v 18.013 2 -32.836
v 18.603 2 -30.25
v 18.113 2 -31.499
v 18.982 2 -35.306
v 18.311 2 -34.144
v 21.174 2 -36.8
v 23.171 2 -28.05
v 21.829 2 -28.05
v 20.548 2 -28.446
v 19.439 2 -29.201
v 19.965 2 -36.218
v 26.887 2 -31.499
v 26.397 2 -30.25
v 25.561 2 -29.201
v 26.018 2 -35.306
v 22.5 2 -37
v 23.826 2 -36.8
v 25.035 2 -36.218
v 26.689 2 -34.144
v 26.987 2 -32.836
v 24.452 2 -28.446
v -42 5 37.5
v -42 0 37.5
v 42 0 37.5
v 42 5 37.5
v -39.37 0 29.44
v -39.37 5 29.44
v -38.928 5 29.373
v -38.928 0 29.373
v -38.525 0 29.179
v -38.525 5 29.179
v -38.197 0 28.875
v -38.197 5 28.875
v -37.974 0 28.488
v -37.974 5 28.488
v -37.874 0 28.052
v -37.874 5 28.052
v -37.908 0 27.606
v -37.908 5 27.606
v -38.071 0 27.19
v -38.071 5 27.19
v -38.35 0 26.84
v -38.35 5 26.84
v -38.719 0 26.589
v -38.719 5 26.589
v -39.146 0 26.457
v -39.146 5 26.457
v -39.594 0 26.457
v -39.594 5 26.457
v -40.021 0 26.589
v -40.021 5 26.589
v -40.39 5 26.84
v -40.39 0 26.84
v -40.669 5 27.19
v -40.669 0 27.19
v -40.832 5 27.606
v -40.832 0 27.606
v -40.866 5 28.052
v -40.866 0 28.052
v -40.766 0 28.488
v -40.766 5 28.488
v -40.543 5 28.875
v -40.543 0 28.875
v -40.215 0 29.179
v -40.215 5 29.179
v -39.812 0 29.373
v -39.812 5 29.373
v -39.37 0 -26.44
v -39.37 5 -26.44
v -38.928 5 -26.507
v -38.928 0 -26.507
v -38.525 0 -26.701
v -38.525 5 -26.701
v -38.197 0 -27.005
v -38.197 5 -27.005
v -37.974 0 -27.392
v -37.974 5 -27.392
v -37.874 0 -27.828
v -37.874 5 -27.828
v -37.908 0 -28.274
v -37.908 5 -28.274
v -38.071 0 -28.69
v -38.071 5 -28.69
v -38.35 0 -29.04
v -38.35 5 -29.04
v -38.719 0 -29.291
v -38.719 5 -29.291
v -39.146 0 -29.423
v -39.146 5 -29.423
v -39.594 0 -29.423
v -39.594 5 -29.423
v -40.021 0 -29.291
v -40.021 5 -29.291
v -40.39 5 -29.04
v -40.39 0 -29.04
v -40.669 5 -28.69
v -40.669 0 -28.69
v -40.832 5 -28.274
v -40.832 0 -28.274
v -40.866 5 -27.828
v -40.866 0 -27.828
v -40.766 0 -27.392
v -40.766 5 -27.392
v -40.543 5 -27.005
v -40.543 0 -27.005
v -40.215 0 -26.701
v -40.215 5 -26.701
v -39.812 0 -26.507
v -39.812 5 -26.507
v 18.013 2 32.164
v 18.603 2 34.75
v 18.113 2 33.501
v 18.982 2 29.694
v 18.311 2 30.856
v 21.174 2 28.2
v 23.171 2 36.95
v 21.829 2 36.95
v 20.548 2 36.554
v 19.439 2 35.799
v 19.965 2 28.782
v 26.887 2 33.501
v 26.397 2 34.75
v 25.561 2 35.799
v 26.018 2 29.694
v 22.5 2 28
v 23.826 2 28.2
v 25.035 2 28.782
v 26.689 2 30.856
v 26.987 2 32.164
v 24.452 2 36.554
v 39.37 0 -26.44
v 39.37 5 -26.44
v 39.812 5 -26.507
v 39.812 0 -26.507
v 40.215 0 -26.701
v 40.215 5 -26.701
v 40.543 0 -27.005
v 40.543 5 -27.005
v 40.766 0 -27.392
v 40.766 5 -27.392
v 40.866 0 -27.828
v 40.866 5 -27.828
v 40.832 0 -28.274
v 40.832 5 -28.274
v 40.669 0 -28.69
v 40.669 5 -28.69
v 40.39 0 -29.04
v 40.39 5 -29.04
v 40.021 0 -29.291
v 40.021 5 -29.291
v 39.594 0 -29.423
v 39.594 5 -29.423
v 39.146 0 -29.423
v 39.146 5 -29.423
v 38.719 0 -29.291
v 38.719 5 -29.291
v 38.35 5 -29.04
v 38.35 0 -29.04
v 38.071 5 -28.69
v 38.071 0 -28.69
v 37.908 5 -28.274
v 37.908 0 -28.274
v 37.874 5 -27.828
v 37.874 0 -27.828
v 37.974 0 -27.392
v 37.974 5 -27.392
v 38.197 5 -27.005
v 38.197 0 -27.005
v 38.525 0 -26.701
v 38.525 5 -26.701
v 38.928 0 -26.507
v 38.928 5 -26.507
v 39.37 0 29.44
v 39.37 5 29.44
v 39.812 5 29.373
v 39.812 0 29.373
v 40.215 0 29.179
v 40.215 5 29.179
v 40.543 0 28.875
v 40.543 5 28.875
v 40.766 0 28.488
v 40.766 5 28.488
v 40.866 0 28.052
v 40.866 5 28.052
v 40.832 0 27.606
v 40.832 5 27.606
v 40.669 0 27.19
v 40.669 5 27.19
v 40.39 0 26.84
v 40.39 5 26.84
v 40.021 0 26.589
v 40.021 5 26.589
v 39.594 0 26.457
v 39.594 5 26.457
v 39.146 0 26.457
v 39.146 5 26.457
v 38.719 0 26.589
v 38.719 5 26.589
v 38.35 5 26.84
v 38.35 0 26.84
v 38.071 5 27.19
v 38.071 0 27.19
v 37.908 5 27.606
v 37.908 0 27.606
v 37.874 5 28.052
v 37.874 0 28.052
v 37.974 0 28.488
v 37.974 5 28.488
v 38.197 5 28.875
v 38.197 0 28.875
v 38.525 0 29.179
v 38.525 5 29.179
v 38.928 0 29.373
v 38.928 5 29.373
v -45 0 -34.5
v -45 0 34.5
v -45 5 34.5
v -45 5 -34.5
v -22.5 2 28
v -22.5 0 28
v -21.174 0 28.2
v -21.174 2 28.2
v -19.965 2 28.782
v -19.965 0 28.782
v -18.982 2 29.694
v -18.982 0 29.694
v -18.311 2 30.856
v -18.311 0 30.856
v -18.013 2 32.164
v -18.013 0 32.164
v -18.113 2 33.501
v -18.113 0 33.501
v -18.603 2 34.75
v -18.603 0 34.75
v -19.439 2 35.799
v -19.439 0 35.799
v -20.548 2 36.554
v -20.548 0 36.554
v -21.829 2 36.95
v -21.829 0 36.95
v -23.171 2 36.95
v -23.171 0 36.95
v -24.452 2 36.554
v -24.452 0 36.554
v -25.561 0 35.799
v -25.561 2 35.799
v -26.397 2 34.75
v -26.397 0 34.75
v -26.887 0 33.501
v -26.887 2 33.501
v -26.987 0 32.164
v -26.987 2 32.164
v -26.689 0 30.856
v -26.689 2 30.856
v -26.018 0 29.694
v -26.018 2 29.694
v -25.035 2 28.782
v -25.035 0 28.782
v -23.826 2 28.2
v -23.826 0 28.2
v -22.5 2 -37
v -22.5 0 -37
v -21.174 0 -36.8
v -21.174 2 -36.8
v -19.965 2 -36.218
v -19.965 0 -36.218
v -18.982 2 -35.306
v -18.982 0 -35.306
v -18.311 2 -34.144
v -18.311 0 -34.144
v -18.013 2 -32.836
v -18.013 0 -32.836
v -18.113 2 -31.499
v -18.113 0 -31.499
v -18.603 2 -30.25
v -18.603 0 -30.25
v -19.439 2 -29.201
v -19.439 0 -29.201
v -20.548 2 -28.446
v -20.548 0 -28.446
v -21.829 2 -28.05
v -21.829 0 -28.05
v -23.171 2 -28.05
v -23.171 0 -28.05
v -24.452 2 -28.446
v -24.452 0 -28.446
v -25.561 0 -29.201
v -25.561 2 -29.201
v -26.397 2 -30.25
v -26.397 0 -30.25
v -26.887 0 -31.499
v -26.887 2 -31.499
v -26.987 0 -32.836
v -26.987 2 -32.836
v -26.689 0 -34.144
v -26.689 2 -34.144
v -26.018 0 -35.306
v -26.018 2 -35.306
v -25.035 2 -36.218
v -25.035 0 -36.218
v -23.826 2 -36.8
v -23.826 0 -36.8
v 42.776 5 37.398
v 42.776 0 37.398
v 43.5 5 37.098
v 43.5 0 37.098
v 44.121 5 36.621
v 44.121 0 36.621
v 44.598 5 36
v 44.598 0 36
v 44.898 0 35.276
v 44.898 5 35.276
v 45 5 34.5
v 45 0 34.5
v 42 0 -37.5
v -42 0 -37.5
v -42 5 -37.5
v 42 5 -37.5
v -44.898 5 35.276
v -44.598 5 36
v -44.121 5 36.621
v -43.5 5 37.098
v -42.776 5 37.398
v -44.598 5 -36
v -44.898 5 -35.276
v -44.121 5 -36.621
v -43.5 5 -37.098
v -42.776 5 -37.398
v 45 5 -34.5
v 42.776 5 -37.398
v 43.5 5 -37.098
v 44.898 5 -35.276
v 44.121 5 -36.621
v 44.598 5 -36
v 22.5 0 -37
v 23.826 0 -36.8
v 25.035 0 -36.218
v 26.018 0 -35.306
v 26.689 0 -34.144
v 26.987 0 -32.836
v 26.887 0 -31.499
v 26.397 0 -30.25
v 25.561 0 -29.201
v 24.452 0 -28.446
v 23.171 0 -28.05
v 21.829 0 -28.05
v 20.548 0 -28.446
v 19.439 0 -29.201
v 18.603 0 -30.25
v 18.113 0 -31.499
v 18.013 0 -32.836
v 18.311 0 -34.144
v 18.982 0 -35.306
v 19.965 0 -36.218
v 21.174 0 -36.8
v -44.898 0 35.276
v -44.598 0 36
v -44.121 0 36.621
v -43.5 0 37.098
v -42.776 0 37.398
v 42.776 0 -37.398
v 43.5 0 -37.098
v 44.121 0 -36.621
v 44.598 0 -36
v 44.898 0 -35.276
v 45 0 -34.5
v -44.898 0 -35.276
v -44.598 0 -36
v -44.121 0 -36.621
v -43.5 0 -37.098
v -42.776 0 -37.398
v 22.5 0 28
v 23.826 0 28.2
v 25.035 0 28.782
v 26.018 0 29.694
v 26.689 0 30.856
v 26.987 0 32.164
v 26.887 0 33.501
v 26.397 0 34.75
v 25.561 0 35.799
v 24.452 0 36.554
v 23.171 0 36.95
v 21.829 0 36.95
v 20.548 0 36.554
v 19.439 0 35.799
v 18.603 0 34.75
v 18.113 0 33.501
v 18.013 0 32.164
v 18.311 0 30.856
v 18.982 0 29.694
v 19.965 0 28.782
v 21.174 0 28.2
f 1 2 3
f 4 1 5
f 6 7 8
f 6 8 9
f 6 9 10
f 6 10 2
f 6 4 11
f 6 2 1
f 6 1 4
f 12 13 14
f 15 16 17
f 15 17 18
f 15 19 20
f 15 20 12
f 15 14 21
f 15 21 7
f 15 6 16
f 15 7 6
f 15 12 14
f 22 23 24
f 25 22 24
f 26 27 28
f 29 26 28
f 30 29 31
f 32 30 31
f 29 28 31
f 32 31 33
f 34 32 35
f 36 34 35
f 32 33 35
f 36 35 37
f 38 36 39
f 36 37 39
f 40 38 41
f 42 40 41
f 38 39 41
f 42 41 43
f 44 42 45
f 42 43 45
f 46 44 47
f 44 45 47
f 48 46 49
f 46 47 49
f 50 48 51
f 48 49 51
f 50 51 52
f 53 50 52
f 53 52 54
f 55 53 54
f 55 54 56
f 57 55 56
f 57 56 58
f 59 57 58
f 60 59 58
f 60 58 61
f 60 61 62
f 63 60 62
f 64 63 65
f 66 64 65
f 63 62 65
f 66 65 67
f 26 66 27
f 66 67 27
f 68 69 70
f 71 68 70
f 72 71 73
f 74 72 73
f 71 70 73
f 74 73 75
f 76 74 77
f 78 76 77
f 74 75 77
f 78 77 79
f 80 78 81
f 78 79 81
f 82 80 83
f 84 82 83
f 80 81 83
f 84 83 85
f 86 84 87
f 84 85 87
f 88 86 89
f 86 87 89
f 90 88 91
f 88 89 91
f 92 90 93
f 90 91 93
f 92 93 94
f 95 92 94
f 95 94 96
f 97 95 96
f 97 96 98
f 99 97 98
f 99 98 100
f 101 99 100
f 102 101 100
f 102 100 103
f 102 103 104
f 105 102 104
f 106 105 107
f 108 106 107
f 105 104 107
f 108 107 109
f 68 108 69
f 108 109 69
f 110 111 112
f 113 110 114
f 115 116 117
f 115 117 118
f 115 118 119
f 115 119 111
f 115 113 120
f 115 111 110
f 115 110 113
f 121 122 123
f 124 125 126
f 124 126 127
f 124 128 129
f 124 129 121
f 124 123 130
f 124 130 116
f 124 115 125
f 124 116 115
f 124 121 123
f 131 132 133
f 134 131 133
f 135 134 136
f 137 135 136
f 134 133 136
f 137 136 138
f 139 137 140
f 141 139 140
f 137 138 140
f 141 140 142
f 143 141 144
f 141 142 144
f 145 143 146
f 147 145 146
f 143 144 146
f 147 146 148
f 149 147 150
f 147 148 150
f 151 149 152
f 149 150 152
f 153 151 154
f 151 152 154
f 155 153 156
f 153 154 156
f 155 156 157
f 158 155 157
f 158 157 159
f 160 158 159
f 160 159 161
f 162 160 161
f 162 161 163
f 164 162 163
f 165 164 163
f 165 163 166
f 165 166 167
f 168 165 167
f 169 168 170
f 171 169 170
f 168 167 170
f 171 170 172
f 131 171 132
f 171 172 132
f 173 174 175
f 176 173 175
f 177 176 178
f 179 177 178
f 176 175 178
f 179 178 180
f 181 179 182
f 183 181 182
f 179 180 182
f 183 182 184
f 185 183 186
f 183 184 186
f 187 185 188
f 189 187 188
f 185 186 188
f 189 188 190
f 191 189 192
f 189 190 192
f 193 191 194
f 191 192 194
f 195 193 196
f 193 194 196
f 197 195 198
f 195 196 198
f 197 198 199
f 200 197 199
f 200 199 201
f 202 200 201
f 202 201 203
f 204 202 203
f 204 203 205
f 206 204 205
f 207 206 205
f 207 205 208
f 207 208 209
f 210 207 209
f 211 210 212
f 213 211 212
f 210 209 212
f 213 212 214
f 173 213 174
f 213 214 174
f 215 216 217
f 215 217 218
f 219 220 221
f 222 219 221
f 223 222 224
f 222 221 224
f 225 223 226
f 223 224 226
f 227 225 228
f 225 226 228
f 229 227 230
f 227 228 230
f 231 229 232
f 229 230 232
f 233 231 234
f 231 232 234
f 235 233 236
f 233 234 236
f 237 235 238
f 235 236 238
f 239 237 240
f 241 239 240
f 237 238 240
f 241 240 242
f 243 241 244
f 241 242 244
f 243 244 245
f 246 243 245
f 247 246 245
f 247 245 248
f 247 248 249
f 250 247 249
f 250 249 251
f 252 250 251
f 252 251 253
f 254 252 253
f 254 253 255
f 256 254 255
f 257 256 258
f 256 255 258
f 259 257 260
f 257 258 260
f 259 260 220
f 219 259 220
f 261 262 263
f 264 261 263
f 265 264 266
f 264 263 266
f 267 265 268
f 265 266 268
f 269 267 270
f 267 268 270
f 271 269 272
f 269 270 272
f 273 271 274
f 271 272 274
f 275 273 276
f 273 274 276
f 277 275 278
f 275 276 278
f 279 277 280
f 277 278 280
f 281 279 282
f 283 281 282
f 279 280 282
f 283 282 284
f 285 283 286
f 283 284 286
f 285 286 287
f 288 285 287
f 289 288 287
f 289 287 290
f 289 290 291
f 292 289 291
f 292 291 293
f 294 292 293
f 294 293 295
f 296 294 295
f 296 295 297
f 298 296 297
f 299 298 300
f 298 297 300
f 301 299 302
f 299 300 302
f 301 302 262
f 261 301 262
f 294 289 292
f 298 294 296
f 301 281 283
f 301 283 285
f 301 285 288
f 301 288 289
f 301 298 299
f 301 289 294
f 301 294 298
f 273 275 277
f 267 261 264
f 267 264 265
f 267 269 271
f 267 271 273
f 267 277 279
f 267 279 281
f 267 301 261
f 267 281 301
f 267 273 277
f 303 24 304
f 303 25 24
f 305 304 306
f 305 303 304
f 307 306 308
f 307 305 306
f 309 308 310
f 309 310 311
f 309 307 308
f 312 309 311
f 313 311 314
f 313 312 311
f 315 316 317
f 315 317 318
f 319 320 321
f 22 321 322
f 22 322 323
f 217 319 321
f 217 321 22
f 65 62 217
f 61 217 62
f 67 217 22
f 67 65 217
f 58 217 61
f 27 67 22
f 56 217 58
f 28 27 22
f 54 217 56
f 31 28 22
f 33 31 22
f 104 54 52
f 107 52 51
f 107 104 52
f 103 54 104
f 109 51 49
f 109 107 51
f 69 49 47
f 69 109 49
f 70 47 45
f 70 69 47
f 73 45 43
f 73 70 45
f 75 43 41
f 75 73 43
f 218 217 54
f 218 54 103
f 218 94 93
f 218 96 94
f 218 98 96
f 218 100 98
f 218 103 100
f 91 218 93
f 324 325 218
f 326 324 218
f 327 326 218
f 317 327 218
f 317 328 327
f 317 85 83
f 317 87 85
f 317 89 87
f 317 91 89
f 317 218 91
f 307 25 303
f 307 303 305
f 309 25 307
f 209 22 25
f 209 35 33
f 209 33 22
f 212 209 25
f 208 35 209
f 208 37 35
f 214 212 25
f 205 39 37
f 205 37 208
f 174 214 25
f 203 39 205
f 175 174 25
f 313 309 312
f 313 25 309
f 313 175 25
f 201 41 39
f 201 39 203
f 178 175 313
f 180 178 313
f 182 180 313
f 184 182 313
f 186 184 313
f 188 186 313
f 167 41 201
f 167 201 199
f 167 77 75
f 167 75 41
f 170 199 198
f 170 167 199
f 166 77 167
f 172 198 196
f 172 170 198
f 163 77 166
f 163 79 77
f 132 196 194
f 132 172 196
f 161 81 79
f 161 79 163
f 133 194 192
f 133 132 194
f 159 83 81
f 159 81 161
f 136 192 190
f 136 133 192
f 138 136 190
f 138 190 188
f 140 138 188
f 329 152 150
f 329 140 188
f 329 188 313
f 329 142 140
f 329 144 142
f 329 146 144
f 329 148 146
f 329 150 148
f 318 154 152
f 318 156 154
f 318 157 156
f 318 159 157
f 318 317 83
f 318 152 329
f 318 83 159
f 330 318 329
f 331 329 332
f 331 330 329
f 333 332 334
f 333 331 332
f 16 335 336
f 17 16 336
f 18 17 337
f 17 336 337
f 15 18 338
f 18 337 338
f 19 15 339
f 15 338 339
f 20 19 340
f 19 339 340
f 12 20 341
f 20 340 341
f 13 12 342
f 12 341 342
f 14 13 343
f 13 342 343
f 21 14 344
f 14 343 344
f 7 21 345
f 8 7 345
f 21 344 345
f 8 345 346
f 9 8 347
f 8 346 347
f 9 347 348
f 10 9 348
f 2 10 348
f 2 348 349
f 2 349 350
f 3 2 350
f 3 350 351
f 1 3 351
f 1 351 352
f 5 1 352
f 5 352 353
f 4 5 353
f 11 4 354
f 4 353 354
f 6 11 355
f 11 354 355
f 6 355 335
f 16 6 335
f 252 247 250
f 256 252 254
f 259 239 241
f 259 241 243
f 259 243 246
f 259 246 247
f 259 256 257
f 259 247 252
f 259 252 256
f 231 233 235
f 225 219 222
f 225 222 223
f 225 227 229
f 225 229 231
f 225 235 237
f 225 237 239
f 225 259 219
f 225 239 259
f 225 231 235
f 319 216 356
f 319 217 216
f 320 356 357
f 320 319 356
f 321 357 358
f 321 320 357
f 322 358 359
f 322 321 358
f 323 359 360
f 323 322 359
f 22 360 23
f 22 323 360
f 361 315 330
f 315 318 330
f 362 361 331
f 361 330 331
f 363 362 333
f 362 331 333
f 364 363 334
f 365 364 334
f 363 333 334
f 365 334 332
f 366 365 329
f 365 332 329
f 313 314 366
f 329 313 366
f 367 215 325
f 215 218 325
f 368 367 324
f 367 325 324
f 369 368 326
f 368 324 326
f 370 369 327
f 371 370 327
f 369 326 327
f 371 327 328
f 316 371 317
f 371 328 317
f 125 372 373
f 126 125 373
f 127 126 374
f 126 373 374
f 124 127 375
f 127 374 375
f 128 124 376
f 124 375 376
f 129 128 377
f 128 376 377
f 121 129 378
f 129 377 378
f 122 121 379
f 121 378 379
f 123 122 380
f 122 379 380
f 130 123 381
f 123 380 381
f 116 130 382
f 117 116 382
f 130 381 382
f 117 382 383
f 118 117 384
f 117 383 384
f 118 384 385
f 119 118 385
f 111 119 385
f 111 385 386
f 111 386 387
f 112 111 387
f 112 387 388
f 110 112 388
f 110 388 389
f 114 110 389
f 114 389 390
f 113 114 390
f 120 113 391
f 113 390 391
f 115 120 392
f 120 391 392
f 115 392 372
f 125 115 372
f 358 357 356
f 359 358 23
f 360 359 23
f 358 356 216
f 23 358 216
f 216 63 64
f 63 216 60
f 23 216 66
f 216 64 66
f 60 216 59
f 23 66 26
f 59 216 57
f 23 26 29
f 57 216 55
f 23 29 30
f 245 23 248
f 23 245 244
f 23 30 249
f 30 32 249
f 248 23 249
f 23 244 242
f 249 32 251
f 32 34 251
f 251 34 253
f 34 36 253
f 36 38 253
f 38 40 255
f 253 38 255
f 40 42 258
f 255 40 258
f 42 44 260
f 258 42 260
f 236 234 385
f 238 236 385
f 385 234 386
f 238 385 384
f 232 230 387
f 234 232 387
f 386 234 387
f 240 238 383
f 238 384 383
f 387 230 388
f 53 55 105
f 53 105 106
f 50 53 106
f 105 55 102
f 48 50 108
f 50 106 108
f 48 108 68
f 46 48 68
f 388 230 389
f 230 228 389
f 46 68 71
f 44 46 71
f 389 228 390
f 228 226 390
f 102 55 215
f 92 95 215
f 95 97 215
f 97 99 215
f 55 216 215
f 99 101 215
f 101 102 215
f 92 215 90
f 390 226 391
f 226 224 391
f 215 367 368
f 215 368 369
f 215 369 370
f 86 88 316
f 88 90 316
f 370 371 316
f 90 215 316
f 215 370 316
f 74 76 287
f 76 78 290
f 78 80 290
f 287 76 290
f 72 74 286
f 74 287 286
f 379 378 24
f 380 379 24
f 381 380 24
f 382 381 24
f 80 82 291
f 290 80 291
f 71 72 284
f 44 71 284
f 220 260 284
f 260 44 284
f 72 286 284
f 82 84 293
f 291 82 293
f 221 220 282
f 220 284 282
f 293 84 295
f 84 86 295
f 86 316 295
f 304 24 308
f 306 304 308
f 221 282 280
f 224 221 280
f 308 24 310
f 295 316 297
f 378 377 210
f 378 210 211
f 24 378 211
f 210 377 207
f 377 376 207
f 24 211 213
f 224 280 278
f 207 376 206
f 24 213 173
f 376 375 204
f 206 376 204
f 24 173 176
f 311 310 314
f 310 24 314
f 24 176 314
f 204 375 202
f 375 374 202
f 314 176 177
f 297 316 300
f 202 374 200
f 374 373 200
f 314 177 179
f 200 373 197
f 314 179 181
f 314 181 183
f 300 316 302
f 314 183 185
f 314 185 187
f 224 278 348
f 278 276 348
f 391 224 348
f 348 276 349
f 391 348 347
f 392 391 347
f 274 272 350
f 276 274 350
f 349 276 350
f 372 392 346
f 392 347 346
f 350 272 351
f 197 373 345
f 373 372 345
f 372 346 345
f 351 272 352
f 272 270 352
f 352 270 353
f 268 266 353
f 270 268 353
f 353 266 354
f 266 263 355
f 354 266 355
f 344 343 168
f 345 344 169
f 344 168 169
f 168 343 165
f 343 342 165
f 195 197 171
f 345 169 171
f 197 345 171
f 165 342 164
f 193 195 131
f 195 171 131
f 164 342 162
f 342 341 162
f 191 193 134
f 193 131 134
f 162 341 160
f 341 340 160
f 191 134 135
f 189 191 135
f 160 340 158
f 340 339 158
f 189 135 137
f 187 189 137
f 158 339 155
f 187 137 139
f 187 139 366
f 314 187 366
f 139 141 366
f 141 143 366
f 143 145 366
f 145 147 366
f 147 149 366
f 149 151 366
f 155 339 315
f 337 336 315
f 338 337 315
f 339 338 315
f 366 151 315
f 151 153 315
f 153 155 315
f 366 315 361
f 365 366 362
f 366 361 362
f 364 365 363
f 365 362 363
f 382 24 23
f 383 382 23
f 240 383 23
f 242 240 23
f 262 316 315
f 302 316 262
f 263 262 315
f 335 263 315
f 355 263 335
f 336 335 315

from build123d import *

# Parameters (mm, degrees)
SKETCH1_W           = 90
SKETCH1_H           = 75
BOSS_EXTRUDE1_DEPTH = 5
SKETCH2_R           = 1.5
CUT_EXTRUDE1_DEPTH  = 5
SKETCH3_R           = 4.5
CUT_EXTRUDE2_DEPTH  = 2
FILLET1_R           = 3


with BuildPart() as part:
    # Sketch1 → Boss-Extrude1 (new body)
    with BuildSketch(Plane(origin=(0, 0, 0), x_dir=(1, 0, 0), z_dir=(0, 1, 0))):
        Rectangle(SKETCH1_W, SKETCH1_H)
    extrude(amount=BOSS_EXTRUDE1_DEPTH)

    # Sketch2 → Cut-Extrude1 (cut)
    with BuildSketch(Plane(origin=(0, 5, 0), x_dir=(1, 0, 0), z_dir=(0, 1, 0))):
        with Locations(Location((-39.37, 27.94, 0), (0, 0, 270))):
            Circle(SKETCH2_R)
        with Locations(Location((39.37, 27.94, 0), (0, 0, 270))):
            Circle(SKETCH2_R)
        with Locations(Location((39.37, -27.94, 0), (0, 0, 270))):
            Circle(SKETCH2_R)
        with Locations(Location((-39.37, -27.94, 0), (0, 0, 270))):
            Circle(SKETCH2_R)
    extrude(amount=-CUT_EXTRUDE1_DEPTH, mode=Mode.SUBTRACT)

    # Sketch3 → Cut-Extrude2 (cut)
    with BuildSketch(Plane.XZ):
        with Locations(Location((-22.5, -32.5, 0), (0, 0, 270))):
            Circle(SKETCH3_R)
        with Locations(Location((-22.5, 32.5, 0), (0, 0, 270))):
            Circle(SKETCH3_R)
        with Locations(Location((22.5, 32.5, 0), (0, 0, 270))):
            Circle(SKETCH3_R)
        with Locations(Location((22.5, -32.5, 0), (0, 0, 270))):
            Circle(SKETCH3_R)
    extrude(amount=-CUT_EXTRUDE2_DEPTH, mode=Mode.SUBTRACT)

    # Fillet1
    fillet1_edges = [part.edges().sort_by_distance(p)[0] for p in [
        (45, 2.5, 37.5),
        (-45, 2.5, 37.5),
        (-45, 2.5, -37.5),
        (45, 2.5, -37.5),
    ]]
    fillet(fillet1_edges, radius=FILLET1_R)


solid = part.part
